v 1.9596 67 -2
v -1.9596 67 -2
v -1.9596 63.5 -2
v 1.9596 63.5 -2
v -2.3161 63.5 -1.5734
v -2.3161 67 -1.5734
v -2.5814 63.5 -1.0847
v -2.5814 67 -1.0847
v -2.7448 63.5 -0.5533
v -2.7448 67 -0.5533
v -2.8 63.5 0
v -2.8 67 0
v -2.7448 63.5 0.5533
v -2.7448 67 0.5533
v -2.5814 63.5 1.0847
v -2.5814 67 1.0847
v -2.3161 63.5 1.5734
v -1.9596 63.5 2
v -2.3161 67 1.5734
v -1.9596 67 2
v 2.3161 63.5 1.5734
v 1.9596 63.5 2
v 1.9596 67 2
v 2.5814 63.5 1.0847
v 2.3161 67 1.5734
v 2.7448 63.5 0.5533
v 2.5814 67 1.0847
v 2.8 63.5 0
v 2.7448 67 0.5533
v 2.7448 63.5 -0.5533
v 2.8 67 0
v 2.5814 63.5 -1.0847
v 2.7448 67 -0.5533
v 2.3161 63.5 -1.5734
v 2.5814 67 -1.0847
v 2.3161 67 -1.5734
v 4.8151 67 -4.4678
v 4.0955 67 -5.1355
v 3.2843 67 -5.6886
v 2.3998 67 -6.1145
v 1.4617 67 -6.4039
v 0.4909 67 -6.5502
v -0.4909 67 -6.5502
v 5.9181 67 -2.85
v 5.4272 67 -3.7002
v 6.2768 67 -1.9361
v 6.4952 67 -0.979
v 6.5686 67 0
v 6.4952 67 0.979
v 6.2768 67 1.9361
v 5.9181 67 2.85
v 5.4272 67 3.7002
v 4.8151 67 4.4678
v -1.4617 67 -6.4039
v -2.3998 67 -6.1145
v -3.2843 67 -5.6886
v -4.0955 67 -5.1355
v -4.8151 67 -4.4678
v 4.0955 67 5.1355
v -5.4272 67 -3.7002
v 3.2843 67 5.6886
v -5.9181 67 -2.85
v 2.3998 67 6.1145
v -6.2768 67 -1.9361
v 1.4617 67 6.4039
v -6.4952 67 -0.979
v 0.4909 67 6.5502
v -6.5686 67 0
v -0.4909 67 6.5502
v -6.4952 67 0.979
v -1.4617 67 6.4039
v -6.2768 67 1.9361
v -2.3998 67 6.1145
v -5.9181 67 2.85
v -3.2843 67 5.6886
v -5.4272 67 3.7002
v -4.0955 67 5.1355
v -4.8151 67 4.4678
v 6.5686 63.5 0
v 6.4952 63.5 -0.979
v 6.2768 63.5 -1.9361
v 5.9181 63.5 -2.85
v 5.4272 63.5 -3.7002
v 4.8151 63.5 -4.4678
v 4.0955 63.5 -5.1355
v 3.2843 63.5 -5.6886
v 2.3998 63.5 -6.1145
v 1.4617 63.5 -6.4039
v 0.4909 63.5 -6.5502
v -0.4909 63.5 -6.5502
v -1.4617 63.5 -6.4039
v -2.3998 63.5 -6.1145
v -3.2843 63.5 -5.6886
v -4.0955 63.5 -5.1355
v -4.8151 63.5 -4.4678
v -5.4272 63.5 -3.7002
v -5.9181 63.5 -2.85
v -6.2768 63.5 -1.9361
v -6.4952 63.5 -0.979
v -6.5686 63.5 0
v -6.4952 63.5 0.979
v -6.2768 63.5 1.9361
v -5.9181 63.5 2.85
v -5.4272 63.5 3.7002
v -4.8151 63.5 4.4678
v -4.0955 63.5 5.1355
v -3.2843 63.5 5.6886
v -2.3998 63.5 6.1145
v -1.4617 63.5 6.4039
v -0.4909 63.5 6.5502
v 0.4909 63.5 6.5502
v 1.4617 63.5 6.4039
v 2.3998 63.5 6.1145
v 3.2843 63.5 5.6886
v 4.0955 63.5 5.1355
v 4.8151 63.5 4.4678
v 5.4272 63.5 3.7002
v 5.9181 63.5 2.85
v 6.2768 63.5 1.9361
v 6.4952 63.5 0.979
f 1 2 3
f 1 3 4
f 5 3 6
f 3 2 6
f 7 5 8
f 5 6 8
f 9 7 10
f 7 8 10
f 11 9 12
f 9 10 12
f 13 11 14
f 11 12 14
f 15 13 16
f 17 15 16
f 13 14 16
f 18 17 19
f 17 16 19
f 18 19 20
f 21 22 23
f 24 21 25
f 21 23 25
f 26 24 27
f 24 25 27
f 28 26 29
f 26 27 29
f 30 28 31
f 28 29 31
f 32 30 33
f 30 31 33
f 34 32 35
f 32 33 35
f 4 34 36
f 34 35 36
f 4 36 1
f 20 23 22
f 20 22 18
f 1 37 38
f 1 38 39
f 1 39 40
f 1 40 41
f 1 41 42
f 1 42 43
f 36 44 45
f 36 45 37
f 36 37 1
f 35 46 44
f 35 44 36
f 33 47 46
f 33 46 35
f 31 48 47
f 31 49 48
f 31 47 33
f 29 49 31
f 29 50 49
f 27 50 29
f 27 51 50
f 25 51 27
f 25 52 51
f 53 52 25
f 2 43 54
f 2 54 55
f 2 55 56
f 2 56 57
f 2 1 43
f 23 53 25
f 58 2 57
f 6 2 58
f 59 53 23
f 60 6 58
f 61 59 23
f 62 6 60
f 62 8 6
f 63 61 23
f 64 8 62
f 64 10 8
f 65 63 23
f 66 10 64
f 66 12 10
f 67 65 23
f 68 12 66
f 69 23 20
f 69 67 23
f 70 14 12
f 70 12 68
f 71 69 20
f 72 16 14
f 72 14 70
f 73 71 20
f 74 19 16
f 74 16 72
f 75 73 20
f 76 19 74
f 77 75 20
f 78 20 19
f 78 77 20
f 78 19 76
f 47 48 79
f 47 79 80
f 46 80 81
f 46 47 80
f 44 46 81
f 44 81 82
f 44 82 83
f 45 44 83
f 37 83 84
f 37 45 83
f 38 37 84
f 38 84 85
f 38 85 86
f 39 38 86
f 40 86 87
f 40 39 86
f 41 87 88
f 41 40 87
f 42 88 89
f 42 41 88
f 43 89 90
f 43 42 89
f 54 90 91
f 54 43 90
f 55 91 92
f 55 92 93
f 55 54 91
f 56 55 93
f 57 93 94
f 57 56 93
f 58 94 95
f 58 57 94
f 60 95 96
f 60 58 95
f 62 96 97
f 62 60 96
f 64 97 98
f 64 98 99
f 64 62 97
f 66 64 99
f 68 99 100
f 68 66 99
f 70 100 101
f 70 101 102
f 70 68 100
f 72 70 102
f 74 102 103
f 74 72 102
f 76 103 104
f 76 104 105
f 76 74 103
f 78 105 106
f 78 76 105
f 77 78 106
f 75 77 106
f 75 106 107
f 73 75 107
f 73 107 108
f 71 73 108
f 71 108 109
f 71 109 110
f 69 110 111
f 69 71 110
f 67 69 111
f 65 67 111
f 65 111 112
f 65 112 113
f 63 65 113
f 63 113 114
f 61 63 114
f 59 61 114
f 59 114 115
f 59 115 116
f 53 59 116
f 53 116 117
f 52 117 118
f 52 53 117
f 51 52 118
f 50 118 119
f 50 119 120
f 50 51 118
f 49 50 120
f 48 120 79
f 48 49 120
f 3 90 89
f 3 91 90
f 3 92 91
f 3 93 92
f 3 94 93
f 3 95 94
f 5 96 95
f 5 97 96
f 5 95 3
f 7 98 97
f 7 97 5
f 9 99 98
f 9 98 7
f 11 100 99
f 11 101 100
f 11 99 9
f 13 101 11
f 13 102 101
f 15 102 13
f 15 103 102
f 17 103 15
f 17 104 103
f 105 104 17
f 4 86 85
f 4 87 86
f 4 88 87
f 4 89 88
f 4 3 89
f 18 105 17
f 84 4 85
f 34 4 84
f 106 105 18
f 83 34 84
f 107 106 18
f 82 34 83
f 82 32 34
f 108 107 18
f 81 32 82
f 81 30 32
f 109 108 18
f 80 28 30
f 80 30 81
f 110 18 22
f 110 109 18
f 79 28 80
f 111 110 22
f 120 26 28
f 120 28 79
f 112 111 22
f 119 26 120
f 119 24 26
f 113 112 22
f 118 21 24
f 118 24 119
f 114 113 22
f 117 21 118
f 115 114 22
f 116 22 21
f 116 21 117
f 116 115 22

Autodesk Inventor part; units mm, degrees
ref_plane "YZ Plane" through (0, 0, 0) normal (1, 0, 0) x (0, 1, 0)
ref_plane "XZ Plane" through (0, 0, 0) normal (0, 1, 0) x (-1, 0, 0)
ref_plane "XY Plane" through (0, 0, 0) normal (0, 0, 1) x (1, 0, 0)
sketch "Sketch1" plane through (0, 0, 0) normal (0, 1, 0) x (-1, 0, 0)
  circle A0 centre (0, 0) radius 19.05
  dimension "d0" = 38.1
extrude "Extrusion1" add sketch "Sketch1" along normal blind 67
sketch "Sketch2" plane through (0, 0, 0) normal (0, -1, 0) x (1, 0, 0)
  circle A0 centre (0, 0) radius 11.025
  dimension "d3" = 22.05
extrude "Extrusion2" cut sketch "Sketch2" against normal blind 7
ref_plane "Work Plane1" through (0, 33.5, 0) normal (0, 1, 0) x (1, 0, 0)
ref_plane "Work Plane2" through (0, 22, 0) normal (0, -1, 0) x (1, 0, 0)
sketch "Sketch4" plane through (0, 22, 0) normal (0, -1, 0) x (1, 0, 0)
  circle A0 centre (0, 0) radius 13.97
  dimension "d7" = 27.94
sketch "Sketch5" plane through (0, 7, 0) normal (0, -1, 0) x (1, 0, 0)
  circle A0 centre (0, 0) radius 11.025 projected
  circle A1 centre (0, 0) radius 11.025
ref_plane "Work Plane3" through (0, 2, 0) normal (0, -1, 0) x (1, 0, 0)
ref_plane "Work Plane4" through (0, 12, 0) normal (0, -1, 0) x (1, 0, 0)
sketch "Sketch8" plane through (0, 12, 0) normal (0, -1, 0) x (1, 0, 0)
  circle A0 centre (0, 0) radius 9.5
  dimension "d11" = 19
sketch "Sketch9" plane through (0, 33.5, 0) normal (0, 1, 0) x (1, 0, 0)
  circle A0 centre (0, 0) radius 13.97
  dimension "d12" = 27.94
loft "Loft1" cut profiles "Sketch5", "Sketch8", "Sketch4", "Sketch9"
mirror "Mirror1" about plane through (0, 33.5, 0) normal (0, 1, 0) of "Loft1", "Extrusion2"
sketch "Sketch10" plane through (0, 67, 0) normal (0, 1, 0) x (1, 0, 0)
  circle A0 centre (0, 0) radius 16.3911
extrude "Extrusion3" add sketch "Sketch10" against normal blind 12.7
sketch "Sketch12" plane through (0, 67, 0) normal (0, 1, 0) x (1, 0, 0)
  circle A0 centre (0, 0) radius 2.8
  line L0 (0, 0) -> (0, 2) construction
  line L1 (0, 0) -> (0, -2) construction
  line L2 (0, 2) -> (-1.9596, 2)
  line L3 (0, 2) -> (1.9596, 2)
  line L4 (0, -2) -> (-1.9596, -2)
  line L5 (0, -2) -> (1.9596, -2)
  dimension "d23" = 5.6
  dimension "d24" = 2
  dimension "d25" = 2
extrude "Extrusion4" cut sketch "Sketch12" against normal blind 10 contours A0 L5 L4 L2 L3
sketch "Sketch13" plane through (0, 0, 0) normal (0, -1, 0) x (1, 0, 0)
  circle A0 centre (0, 0) radius 13.97 projected
  circle A1 centre (0, 0) radius 28.9364
  point P0 (13.97, 0)
extrude "Extrusion5" cut sketch "Sketch13" against normal blind 63.5 contours A0 | A1
sketch "Sketch14" plane through (0, 67, 0) normal (0, 1, 0) x (1, 0, 0)
  arc A0 (1.9596, -2) -> (1.9596, 2) centre (0, 0) ccw projected
  circle A1 centre (0, 0) radius 6.5686
  circle A2 centre (0, 0) radius 30.6019
extrude "Extrusion6" cut sketch "Sketch14" against normal blind 63.5
properties part number "motor fit test"
